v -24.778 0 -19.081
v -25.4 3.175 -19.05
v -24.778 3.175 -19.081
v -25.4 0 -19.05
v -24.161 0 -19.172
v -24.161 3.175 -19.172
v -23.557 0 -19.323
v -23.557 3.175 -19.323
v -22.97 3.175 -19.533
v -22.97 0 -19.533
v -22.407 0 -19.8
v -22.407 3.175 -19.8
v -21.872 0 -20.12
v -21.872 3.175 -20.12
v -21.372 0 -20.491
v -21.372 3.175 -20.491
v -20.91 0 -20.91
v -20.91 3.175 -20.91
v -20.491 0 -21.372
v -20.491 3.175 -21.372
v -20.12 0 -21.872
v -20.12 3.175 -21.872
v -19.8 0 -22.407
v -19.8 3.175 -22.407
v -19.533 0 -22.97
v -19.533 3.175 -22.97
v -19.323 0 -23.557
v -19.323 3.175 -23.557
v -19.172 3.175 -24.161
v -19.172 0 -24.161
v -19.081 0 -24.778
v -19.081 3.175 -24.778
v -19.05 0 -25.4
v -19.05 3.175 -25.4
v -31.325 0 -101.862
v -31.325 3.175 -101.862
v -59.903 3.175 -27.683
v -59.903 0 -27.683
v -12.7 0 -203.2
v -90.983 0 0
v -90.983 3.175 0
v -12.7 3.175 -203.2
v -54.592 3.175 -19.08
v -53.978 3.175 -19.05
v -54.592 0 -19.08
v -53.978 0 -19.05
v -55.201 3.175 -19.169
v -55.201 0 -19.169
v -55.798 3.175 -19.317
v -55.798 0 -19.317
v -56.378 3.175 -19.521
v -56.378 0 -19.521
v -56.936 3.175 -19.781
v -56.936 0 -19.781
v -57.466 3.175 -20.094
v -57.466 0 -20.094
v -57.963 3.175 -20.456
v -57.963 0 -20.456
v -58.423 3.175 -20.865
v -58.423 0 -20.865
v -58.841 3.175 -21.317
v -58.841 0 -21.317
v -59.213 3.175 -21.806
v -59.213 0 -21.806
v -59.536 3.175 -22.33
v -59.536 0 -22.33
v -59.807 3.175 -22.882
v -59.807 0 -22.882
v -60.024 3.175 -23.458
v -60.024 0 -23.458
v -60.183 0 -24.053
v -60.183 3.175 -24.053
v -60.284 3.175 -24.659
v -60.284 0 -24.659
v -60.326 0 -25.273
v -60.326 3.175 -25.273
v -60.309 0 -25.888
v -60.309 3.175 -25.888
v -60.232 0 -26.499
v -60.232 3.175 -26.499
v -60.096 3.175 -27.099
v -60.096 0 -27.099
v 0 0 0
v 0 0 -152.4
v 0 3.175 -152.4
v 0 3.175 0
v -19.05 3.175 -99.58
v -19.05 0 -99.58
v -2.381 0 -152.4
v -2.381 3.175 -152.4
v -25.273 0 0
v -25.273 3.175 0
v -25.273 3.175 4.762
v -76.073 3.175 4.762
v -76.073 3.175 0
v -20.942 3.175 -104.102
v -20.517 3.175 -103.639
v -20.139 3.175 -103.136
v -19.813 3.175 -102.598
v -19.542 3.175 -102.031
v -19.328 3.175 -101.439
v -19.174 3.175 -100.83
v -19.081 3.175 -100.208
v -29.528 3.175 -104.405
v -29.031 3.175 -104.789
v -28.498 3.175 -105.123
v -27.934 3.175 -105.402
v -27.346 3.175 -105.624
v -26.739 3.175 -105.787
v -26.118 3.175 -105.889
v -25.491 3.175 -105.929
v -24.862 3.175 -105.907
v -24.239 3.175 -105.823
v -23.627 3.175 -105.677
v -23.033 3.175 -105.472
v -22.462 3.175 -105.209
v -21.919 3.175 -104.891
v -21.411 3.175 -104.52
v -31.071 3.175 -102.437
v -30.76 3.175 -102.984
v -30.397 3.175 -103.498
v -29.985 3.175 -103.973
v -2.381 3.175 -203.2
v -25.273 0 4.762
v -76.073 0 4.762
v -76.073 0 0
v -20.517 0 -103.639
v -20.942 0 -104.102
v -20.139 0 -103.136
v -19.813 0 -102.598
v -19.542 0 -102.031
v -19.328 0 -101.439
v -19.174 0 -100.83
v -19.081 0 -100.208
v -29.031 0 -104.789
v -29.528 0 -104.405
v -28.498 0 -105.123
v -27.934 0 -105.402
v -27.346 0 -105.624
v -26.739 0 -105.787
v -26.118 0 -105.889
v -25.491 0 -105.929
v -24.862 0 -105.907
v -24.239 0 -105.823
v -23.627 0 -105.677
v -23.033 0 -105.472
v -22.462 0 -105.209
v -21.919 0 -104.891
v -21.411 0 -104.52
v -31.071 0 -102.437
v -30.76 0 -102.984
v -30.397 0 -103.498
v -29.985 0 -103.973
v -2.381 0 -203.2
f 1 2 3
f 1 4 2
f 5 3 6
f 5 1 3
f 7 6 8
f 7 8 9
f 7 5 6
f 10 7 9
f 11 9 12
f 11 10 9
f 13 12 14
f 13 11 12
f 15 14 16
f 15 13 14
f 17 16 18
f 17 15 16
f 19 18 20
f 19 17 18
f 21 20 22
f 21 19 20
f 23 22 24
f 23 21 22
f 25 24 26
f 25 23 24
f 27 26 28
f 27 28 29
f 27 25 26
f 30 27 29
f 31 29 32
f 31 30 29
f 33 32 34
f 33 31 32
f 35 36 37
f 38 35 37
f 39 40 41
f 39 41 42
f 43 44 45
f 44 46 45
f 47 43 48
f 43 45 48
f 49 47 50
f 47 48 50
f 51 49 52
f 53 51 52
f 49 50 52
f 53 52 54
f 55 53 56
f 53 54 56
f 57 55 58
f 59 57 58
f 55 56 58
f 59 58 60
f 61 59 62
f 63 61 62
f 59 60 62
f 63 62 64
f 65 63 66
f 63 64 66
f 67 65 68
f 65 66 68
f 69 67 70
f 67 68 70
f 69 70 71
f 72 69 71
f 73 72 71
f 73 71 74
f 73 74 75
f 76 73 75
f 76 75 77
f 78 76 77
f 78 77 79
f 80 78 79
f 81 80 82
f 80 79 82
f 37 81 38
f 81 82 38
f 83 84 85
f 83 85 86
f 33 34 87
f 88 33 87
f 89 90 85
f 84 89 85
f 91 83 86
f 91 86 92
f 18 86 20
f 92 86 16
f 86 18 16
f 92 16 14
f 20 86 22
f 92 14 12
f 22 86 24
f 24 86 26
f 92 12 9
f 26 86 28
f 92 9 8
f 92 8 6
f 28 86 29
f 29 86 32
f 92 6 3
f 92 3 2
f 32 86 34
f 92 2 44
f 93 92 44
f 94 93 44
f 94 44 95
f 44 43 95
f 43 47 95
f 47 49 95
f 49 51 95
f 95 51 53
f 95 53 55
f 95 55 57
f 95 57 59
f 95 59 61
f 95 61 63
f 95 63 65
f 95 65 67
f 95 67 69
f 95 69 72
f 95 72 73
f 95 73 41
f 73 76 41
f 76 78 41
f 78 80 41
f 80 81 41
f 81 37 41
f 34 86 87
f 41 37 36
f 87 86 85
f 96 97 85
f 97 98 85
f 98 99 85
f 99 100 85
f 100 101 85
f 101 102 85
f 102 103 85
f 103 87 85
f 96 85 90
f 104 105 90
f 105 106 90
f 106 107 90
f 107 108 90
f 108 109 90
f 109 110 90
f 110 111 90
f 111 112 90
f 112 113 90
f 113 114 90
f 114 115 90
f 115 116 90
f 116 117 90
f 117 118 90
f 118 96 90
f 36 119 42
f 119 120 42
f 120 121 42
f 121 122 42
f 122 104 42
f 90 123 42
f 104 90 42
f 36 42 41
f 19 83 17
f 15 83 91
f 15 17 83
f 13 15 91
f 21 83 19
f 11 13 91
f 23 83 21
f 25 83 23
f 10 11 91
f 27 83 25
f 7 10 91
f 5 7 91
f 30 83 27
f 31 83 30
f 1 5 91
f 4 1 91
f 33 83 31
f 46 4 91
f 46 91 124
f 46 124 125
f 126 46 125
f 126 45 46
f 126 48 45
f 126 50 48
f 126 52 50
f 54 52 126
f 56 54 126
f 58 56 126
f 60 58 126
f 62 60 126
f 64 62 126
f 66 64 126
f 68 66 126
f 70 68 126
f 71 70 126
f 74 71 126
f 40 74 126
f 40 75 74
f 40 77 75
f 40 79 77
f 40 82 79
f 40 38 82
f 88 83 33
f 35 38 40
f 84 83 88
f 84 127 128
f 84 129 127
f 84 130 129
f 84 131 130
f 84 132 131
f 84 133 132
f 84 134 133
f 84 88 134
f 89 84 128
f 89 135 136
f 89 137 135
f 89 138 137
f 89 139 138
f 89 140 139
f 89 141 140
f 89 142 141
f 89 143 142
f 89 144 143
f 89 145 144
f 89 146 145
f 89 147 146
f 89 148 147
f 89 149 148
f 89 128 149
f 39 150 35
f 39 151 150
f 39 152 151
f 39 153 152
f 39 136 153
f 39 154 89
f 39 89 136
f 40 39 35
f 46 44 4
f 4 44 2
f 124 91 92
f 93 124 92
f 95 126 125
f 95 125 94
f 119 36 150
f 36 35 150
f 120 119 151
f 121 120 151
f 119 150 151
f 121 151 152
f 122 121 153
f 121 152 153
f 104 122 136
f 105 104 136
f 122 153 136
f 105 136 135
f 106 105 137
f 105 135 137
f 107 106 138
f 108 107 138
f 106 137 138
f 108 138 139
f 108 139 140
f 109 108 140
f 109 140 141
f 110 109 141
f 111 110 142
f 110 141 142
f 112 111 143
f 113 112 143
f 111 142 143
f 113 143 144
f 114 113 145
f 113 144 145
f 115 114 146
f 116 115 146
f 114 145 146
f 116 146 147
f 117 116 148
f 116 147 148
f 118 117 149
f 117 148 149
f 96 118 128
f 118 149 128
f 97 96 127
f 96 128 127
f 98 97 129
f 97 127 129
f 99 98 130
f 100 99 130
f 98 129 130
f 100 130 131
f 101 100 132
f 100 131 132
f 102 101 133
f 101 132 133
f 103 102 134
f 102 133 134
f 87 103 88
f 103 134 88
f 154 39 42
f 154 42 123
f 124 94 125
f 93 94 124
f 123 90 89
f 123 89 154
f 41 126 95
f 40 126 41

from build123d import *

# Parameters (mm, degrees)
BOSS_EXTRUDE1_DEPTH = 3.175
CUT_EXTRUDE2_DEPTH  = 3.175
FILLET2_R           = 6.35
SKETCH5_W           = 50.8
SKETCH5_H           = 3.175
BOSS_EXTRUDE2_DEPTH = 4.7625
SKETCH6_W           = 2.38125
SKETCH6_H           = 50.8
CUT_EXTRUDE3_DEPTH  = 223.661605403


with BuildPart() as part:
    # Sketch2 → Boss-Extrude1 (new body)
    with BuildSketch(Plane(origin=(0, 0, 0), x_dir=(1, 0, 0), z_dir=(0, 1, 0))):
        Polygon((0, 0), (-90.9828, 0), (-12.7, 203.2), (0, 203.2), align=None)
    extrude(amount=BOSS_EXTRUDE1_DEPTH)

    # Sketch3 → Cut-Extrude2 (cut)
    with BuildSketch(Plane(origin=(0, 3.175, 0), x_dir=(1, 0, 0), z_dir=(0, 1, 0))):
        Polygon((-19.05, 19.05), (-19.05, 133.726180748), (-63.228998633, 19.05), align=None)
    extrude(amount=-CUT_EXTRUDE2_DEPTH, mode=Mode.SUBTRACT)

    # Fillet2
    fillet2_edges = [part.edges().sort_by_distance(p)[0] for p in [
        (-19.05, 1.5875, -19.05),
        (-63.228998633, 1.5875, -19.05),
        (-19.05, 1.5875, -133.726180748),
    ]]
    fillet(fillet2_edges, radius=FILLET2_R)

    # Sketch5 → Boss-Extrude2 (add)
    with BuildSketch(Plane.XY):
        with Locations((-50.673, 1.5875)):
            Rectangle(SKETCH5_W, SKETCH5_H)
    extrude(amount=BOSS_EXTRUDE2_DEPTH)

    # Sketch6 → Cut-Extrude3 (cut, through all)
    with BuildSketch(Plane(origin=(0, 3.175, 0), x_dir=(1, 0, 0), z_dir=(0, 1, 0))):
        with Locations((-1.190625, 177.8)):
            Rectangle(SKETCH6_W, SKETCH6_H)
    extrude(amount=-CUT_EXTRUDE3_DEPTH, mode=Mode.SUBTRACT)


solid = part.part
